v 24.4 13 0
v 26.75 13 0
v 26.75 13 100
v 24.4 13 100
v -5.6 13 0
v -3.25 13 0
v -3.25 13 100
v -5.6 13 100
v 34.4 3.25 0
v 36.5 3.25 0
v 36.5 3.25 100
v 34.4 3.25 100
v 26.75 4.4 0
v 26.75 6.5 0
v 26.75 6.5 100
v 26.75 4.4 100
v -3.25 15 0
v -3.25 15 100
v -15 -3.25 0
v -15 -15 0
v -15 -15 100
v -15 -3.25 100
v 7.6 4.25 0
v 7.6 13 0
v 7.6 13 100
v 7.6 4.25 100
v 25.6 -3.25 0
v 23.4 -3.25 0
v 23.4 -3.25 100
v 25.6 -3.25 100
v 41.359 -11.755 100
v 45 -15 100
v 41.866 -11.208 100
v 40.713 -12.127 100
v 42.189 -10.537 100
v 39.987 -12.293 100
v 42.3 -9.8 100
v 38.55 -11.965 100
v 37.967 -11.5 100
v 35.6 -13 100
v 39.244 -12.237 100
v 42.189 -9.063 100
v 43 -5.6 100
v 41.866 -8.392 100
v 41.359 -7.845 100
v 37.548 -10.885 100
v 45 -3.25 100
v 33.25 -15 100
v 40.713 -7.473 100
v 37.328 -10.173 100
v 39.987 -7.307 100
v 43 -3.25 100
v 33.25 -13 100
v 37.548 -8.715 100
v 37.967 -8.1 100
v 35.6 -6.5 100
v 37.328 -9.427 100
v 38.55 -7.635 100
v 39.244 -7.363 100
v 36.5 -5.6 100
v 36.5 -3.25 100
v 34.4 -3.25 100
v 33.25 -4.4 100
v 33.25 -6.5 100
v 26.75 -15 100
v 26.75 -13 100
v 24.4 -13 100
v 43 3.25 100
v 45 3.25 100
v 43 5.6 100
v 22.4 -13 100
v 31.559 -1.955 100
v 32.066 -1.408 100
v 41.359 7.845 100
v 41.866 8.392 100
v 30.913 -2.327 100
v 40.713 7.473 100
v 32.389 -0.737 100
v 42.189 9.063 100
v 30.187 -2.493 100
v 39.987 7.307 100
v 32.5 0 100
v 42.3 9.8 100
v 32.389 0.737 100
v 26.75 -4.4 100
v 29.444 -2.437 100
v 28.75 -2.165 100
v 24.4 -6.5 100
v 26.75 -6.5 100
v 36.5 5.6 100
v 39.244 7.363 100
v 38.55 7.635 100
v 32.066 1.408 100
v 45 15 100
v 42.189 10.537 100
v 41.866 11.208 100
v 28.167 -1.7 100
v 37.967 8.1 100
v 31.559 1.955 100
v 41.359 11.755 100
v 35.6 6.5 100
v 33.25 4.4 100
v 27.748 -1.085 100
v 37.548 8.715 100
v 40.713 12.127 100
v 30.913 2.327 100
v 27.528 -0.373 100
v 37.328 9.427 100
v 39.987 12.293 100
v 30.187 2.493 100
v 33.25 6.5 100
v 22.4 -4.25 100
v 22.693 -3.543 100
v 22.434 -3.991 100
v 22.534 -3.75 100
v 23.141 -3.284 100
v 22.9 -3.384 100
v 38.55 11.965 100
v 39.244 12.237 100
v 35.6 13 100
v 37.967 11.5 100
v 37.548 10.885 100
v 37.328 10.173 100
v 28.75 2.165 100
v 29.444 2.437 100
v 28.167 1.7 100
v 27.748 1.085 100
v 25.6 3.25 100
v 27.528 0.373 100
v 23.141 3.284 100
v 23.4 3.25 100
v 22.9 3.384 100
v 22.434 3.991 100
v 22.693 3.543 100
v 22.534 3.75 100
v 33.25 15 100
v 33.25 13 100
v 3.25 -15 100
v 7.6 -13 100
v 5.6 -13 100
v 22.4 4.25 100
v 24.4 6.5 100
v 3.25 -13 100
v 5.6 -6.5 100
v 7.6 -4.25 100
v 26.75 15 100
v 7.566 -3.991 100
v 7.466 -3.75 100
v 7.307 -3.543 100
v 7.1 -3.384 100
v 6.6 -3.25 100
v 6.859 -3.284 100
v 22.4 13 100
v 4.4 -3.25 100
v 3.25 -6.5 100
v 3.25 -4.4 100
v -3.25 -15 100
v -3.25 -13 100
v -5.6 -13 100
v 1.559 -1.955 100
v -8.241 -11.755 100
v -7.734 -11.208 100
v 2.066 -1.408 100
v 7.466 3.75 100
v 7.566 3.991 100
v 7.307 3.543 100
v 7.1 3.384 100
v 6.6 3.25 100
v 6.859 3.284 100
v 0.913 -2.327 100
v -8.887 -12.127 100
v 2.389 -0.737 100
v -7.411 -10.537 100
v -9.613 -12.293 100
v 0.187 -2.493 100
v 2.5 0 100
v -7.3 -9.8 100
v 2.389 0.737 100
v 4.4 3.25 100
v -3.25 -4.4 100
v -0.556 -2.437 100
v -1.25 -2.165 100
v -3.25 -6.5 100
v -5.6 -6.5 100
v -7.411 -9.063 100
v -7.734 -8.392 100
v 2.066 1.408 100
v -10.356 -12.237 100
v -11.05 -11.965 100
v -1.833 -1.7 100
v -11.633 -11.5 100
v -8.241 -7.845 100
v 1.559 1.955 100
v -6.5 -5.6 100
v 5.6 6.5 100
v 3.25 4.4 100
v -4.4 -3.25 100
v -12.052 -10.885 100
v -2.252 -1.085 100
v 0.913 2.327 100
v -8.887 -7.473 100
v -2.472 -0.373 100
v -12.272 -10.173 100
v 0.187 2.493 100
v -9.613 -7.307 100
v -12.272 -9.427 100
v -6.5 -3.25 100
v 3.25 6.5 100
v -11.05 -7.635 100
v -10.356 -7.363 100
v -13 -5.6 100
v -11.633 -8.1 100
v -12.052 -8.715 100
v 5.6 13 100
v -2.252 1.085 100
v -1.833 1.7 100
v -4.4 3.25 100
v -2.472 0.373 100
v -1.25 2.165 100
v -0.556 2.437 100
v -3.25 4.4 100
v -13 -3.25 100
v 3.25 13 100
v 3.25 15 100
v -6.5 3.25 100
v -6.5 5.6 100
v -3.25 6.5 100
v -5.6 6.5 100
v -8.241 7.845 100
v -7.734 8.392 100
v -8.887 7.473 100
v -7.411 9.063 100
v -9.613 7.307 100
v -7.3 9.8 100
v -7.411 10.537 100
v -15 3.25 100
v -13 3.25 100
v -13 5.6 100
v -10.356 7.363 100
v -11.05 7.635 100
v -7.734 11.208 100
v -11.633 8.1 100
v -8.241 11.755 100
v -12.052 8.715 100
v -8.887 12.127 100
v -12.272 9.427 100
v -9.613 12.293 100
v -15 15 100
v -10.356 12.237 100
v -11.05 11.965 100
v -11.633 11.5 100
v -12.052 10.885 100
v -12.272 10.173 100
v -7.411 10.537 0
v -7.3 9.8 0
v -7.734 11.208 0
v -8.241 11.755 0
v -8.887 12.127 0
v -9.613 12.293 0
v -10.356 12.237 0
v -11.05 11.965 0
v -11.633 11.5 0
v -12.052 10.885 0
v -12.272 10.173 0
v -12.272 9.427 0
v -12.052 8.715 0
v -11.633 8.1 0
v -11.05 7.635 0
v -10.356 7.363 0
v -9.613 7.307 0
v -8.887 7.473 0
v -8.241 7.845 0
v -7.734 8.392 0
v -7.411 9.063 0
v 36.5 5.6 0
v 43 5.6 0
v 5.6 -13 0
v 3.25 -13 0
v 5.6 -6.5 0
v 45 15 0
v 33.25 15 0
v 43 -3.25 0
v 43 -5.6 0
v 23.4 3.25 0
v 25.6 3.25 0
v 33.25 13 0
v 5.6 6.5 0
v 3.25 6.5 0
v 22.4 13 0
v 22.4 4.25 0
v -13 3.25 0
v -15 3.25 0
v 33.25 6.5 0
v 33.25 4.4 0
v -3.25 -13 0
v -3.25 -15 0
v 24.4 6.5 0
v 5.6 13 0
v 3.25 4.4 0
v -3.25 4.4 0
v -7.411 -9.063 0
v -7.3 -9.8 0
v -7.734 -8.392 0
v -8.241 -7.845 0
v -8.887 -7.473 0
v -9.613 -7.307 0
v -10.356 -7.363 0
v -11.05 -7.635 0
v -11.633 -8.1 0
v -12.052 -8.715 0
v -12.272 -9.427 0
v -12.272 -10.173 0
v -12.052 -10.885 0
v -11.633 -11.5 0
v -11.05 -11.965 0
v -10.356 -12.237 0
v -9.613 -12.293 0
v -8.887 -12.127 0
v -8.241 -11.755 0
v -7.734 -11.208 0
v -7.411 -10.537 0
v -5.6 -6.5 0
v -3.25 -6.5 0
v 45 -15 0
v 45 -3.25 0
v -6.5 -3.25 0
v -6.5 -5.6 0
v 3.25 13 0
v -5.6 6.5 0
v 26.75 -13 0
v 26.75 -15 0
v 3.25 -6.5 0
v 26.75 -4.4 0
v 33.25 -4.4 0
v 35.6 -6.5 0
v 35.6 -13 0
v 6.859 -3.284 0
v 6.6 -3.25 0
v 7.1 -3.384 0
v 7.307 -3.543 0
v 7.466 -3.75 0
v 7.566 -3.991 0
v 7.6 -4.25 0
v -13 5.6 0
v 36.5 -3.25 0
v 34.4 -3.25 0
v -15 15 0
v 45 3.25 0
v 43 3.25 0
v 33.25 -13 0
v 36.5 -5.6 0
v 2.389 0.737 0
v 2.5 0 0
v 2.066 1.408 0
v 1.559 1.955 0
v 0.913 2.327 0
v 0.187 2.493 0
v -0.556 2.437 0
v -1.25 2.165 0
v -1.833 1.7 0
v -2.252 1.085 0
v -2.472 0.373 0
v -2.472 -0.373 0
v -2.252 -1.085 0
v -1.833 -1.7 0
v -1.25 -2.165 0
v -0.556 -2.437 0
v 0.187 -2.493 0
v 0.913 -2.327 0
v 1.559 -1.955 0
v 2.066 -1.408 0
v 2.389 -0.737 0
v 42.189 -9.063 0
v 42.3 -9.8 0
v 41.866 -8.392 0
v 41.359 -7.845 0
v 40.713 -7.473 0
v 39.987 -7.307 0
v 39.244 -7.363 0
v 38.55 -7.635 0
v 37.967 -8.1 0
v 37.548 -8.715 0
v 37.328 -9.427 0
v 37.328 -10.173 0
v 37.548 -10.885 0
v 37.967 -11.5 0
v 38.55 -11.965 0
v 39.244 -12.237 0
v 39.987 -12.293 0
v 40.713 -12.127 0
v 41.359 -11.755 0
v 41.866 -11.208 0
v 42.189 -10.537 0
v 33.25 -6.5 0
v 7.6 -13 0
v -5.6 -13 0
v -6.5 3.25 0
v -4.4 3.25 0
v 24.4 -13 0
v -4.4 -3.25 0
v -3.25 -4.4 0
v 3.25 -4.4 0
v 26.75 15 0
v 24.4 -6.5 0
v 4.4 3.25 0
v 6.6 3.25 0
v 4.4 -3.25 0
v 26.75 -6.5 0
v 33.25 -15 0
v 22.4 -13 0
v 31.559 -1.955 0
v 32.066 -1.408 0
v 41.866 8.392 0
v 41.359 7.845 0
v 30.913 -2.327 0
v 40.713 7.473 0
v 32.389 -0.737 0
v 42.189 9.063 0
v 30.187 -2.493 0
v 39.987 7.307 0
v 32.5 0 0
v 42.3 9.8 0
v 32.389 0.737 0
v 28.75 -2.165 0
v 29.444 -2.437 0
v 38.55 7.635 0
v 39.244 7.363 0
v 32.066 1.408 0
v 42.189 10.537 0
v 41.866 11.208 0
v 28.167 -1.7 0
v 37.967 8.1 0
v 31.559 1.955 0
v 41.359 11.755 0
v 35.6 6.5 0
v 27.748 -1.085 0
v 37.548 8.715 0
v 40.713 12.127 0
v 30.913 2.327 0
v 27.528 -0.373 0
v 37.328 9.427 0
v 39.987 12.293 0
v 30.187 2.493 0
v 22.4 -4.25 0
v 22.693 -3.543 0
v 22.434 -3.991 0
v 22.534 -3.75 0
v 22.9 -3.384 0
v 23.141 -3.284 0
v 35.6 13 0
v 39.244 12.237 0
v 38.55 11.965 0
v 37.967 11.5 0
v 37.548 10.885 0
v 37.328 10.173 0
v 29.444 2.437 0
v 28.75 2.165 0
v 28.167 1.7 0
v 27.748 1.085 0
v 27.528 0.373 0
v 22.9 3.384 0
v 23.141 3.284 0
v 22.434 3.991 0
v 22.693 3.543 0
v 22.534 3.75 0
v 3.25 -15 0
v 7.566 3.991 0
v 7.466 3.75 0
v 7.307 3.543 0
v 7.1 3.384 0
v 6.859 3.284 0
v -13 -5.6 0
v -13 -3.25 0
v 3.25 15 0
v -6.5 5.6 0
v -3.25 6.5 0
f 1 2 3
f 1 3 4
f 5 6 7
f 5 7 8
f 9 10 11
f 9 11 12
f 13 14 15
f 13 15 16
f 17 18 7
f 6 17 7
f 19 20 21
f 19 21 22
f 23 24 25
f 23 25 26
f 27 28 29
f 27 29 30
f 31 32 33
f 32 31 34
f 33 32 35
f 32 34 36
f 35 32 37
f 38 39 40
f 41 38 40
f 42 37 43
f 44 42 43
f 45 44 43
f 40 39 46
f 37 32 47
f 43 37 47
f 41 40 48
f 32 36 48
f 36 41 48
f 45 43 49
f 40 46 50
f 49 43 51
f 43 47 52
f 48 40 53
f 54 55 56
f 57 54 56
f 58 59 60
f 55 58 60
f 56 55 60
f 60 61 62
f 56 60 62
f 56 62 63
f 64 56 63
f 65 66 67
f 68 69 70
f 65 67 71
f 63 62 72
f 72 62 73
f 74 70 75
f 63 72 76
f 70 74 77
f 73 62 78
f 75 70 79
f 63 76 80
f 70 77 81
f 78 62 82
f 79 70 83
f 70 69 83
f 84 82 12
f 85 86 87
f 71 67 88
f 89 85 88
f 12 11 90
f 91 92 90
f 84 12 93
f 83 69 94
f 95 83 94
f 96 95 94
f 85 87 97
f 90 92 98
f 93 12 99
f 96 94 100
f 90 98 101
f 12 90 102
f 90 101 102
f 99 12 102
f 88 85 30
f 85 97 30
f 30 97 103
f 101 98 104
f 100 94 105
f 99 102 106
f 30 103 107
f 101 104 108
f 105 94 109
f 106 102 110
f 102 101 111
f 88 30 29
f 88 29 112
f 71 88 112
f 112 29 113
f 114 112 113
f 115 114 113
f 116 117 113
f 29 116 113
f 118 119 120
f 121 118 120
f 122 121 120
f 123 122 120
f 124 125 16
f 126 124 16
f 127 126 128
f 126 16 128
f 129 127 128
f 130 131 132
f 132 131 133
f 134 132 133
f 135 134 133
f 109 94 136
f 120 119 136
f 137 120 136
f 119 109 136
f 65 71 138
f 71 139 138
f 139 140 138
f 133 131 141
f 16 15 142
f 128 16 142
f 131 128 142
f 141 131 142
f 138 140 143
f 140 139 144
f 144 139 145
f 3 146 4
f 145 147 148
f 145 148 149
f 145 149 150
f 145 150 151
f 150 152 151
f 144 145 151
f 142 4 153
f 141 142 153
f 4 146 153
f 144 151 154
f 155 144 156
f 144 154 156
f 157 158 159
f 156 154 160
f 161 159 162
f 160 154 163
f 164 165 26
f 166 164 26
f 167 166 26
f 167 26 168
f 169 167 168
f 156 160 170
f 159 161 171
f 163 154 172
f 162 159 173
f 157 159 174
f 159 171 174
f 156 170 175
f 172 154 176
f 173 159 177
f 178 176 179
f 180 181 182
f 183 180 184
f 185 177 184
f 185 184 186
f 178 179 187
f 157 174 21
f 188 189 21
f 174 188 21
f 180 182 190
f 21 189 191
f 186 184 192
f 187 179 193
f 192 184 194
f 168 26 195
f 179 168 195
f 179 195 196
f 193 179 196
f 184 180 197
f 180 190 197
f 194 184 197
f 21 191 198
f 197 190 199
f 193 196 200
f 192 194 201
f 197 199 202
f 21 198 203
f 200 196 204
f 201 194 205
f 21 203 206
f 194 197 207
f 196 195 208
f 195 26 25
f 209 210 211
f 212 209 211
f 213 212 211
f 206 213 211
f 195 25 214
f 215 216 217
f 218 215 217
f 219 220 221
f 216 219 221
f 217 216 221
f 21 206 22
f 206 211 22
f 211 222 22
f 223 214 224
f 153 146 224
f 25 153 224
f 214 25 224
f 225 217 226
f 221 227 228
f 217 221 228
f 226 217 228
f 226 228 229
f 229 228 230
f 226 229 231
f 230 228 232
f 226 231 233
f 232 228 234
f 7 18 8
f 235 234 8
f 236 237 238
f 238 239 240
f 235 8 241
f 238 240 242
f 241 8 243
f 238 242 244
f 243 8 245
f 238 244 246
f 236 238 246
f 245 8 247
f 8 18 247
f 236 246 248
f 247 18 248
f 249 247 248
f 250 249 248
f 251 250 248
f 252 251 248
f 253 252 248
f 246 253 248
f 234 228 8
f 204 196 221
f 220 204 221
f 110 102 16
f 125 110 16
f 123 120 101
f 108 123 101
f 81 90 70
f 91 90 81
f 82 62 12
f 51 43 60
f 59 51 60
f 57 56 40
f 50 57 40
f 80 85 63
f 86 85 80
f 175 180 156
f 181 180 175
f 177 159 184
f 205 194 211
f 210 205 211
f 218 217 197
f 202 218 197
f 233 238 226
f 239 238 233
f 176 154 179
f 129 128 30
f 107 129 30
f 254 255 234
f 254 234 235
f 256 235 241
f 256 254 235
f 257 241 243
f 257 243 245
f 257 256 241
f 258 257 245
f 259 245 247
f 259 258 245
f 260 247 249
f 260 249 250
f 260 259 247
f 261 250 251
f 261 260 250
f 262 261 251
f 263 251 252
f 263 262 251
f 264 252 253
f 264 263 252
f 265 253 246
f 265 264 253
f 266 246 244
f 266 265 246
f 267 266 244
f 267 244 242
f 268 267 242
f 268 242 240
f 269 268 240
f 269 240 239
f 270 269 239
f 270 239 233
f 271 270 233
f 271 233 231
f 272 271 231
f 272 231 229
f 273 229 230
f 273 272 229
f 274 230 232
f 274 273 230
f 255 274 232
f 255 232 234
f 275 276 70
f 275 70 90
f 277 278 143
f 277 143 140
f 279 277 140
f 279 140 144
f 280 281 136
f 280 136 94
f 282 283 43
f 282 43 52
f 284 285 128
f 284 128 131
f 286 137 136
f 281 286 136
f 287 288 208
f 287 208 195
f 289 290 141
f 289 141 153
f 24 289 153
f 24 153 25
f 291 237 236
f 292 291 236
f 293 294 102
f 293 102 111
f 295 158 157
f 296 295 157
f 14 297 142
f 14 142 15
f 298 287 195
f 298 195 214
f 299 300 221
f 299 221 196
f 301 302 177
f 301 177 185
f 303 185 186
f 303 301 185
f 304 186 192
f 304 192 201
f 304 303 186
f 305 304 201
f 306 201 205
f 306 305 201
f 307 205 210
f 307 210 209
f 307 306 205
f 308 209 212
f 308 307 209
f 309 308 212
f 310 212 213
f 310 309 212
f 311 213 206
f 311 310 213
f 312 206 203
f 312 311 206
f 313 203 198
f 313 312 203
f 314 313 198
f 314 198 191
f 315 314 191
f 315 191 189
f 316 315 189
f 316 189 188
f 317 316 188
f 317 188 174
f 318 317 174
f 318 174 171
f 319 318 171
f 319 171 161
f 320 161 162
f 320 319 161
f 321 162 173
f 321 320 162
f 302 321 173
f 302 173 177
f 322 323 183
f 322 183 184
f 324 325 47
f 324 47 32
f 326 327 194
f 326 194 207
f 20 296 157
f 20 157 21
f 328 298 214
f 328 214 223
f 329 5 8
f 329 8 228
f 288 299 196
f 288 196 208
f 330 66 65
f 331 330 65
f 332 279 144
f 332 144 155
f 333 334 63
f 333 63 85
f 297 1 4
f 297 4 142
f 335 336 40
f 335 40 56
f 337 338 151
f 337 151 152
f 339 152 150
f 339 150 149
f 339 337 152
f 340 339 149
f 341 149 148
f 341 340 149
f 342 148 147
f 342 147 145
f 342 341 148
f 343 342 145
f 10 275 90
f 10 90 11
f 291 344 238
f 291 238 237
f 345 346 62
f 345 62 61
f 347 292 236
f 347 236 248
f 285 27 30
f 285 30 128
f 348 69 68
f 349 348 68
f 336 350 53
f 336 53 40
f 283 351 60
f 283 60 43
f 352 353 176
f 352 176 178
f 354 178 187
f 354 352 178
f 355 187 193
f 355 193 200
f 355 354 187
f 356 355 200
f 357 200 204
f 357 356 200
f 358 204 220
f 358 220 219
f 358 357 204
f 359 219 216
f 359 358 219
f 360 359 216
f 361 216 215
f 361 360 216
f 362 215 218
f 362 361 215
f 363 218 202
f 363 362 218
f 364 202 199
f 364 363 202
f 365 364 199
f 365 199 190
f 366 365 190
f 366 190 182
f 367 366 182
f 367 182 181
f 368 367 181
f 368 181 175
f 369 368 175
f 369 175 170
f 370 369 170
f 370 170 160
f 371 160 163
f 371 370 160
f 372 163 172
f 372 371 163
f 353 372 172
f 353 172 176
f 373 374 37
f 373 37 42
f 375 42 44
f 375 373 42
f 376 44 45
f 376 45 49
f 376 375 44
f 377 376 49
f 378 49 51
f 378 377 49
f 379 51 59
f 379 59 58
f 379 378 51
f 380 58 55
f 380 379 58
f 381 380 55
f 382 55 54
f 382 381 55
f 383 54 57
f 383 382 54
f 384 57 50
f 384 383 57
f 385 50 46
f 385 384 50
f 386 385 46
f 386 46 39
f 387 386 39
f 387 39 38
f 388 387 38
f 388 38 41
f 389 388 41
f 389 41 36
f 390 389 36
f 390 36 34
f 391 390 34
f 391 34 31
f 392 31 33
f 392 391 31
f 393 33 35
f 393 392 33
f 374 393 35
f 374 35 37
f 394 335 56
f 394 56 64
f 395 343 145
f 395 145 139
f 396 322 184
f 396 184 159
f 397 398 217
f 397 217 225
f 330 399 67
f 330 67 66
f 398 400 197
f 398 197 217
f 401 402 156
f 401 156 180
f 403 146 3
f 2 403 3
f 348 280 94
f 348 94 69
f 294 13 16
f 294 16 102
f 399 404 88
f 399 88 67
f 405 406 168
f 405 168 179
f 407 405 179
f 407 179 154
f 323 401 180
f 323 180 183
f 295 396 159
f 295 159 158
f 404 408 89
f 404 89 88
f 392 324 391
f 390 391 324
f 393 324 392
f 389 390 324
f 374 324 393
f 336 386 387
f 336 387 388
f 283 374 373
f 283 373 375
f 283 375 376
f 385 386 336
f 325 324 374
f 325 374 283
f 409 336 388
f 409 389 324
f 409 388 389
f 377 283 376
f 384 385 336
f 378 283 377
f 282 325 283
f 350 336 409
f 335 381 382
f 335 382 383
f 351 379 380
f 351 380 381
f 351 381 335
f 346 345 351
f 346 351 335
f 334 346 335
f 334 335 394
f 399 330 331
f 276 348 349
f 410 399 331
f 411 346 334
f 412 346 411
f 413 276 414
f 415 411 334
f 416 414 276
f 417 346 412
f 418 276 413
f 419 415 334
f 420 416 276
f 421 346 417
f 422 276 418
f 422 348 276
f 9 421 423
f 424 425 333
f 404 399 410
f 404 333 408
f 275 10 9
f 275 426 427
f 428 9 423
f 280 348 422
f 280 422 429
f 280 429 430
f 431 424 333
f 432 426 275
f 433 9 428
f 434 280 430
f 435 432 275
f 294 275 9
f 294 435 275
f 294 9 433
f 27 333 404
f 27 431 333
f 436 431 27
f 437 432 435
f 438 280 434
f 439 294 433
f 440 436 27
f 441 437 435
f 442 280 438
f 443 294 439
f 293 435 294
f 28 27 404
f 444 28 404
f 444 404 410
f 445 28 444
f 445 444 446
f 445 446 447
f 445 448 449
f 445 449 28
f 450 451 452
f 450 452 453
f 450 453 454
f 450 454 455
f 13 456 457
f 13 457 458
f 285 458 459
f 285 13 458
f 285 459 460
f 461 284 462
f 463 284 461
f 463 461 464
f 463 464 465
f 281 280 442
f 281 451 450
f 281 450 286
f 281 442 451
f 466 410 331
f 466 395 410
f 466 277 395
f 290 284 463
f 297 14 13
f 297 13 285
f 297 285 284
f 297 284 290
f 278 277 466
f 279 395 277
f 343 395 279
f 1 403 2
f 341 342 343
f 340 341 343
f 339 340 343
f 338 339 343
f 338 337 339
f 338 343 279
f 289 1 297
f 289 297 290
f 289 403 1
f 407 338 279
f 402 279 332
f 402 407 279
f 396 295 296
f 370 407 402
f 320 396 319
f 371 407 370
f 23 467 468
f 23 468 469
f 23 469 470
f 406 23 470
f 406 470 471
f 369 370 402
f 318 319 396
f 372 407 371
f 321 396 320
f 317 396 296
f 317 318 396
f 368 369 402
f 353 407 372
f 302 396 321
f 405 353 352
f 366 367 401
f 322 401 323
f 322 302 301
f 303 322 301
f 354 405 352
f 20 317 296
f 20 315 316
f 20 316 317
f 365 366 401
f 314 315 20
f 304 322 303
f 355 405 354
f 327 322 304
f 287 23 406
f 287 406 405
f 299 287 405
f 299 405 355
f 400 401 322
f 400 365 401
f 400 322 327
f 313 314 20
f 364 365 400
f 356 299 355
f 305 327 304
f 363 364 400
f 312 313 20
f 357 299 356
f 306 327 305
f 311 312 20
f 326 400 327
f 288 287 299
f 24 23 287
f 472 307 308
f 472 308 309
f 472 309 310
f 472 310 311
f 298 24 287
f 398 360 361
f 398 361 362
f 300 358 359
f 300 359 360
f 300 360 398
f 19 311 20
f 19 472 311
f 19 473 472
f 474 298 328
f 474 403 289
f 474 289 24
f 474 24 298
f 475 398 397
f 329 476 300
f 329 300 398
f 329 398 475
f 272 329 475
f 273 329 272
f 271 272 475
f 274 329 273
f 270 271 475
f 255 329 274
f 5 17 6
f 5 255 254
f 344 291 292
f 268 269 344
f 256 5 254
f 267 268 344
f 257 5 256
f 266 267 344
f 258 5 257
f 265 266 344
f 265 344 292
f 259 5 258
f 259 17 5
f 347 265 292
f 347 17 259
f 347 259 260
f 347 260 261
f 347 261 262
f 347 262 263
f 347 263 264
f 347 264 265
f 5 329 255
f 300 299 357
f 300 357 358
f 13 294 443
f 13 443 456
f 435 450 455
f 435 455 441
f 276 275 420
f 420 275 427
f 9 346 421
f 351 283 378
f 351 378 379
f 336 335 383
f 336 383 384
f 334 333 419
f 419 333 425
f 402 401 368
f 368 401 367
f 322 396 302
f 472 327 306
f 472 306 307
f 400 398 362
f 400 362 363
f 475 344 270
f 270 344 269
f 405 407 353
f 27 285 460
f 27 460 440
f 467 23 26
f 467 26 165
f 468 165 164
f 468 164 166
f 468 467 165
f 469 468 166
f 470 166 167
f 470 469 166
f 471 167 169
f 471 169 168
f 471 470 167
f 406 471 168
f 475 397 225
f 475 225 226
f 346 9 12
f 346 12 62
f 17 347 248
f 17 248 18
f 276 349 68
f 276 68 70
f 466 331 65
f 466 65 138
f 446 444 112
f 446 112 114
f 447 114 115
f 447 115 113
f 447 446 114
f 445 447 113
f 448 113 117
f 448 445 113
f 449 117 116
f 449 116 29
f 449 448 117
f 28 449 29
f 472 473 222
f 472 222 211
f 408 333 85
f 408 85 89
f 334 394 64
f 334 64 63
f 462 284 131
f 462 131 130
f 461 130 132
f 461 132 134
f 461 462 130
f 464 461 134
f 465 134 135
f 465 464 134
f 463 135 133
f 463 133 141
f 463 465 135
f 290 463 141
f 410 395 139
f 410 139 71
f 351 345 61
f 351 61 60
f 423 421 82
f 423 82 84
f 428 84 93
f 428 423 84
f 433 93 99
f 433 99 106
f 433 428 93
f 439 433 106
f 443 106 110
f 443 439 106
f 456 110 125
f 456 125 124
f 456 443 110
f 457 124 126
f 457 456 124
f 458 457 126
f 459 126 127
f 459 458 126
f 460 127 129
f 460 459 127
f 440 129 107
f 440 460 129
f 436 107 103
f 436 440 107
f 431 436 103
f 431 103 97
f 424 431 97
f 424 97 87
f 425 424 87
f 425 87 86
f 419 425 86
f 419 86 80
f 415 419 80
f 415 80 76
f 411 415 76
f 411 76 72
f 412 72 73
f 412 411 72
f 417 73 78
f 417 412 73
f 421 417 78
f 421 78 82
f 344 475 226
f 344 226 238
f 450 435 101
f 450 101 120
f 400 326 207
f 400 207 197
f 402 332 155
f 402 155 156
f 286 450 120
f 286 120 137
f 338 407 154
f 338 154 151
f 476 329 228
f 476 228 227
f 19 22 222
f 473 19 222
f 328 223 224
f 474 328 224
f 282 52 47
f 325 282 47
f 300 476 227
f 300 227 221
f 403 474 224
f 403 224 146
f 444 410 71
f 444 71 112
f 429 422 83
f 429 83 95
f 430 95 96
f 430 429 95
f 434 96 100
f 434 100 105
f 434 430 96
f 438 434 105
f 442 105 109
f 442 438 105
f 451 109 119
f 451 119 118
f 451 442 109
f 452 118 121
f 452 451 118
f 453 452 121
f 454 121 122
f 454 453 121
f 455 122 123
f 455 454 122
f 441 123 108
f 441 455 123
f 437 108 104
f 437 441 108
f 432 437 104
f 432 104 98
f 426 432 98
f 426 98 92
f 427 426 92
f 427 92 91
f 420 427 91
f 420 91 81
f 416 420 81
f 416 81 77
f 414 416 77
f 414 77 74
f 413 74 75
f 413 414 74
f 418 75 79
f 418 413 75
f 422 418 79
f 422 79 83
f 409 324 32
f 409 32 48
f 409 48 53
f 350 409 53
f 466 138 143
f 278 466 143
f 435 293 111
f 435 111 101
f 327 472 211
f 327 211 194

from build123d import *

# Parameters (mm, degrees)
SKETCH_1_R      = 2.5
EXTRUDE_1_DEPTH = 100


with BuildPart() as part:
    # 草图1 → 凸台-拉伸1 (new body)
    with BuildSketch(Plane.XY):
        Polygon((-15, 15), (-3.25, 15), (-3.25, 13), (-5.6, 13), (-5.6, 6.5), (-3.25, 6.5), (-3.25, 4.4), (3.25, 4.4), (3.25, 6.5), (5.6, 6.5), (5.6, 13), (3.25, 13), (3.25, 15), (26.75, 15), (26.75, 13), (24.4, 13), (24.4, 6.5), (26.75, 6.5), (26.75, 4.4), (33.25, 4.4), (33.25, 6.5), (35.6, 6.5), (35.6, 13), (33.25, 13), (33.25, 15), (45, 15), (45, 3.25), (43, 3.25), (43, 5.6), (36.5, 5.6), (36.5, 3.25), (34.4, 3.25), (34.4, -3.25), (36.5, -3.25), (36.5, -5.6), (43, -5.6), (43, -3.25), (45, -3.25), (45, -15), (33.25, -15), (33.25, -13), (35.6, -13), (35.6, -6.5), (33.25, -6.5), (33.25, -4.4), (26.75, -4.4), (26.75, -6.5), (24.4, -6.5), (24.4, -13), (26.75, -13), (26.75, -15), (3.25, -15), (3.25, -13), (5.6, -13), (5.6, -6.5), (3.25, -6.5), (3.25, -4.4), (-3.25, -4.4), (-3.25, -6.5), (-5.6, -6.5), (-5.6, -13), (-3.25, -13), (-3.25, -15), (-15, -15), (-15, -3.25), (-13, -3.25), (-13, -5.6), (-6.5, -5.6), (-6.5, -3.25), (-4.4, -3.25), (-4.4, 3.25), (-6.5, 3.25), (-6.5, 5.6), (-13, 5.6), (-13, 3.25), (-15, 3.25), align=None)
        Circle(SKETCH_1_R, mode=Mode.SUBTRACT)
        with Locations((30, 0)):
            Circle(SKETCH_1_R, mode=Mode.SUBTRACT)
        with Locations((39.8, 9.8)):
            Circle(SKETCH_1_R, mode=Mode.SUBTRACT)
        with Locations((39.8, -9.8)):
            Circle(SKETCH_1_R, mode=Mode.SUBTRACT)
        with Locations((-9.8, 9.8)):
            Circle(SKETCH_1_R, mode=Mode.SUBTRACT)
        with Locations((-9.8, -9.8)):
            Circle(SKETCH_1_R, mode=Mode.SUBTRACT)
        with BuildLine():
            Line((7.6, 13), (7.6, 4.25))
            ThreePointArc((7.6, 4.25), (7.307106781, 3.542893219), (6.6, 3.25))
            Line((6.6, 3.25), (4.4, 3.25))
            Line((4.4, 3.25), (4.4, -3.25))
            Line((4.4, -3.25), (6.6, -3.25))
            ThreePointArc((6.6, -3.25), (7.307106781, -3.542893219), (7.6, -4.25))
            Line((7.6, -4.25), (7.6, -13))
            Line((7.6, -13), (22.4, -13))
            Line((22.4, -13), (22.4, -4.25))
            ThreePointArc((22.4, -4.25), (22.692893219, -3.542893219), (23.4, -3.25))
            Line((23.4, -3.25), (25.6, -3.25))
            Line((25.6, -3.25), (25.6, 3.25))
            Line((25.6, 3.25), (23.4, 3.25))
            ThreePointArc((23.4, 3.25), (22.692893219, 3.542893219), (22.4, 4.25))
            Line((22.4, 4.25), (22.4, 13))
            Line((22.4, 13), (7.6, 13))
        make_face(mode=Mode.SUBTRACT)
    extrude(amount=EXTRUDE_1_DEPTH)


solid = part.part
